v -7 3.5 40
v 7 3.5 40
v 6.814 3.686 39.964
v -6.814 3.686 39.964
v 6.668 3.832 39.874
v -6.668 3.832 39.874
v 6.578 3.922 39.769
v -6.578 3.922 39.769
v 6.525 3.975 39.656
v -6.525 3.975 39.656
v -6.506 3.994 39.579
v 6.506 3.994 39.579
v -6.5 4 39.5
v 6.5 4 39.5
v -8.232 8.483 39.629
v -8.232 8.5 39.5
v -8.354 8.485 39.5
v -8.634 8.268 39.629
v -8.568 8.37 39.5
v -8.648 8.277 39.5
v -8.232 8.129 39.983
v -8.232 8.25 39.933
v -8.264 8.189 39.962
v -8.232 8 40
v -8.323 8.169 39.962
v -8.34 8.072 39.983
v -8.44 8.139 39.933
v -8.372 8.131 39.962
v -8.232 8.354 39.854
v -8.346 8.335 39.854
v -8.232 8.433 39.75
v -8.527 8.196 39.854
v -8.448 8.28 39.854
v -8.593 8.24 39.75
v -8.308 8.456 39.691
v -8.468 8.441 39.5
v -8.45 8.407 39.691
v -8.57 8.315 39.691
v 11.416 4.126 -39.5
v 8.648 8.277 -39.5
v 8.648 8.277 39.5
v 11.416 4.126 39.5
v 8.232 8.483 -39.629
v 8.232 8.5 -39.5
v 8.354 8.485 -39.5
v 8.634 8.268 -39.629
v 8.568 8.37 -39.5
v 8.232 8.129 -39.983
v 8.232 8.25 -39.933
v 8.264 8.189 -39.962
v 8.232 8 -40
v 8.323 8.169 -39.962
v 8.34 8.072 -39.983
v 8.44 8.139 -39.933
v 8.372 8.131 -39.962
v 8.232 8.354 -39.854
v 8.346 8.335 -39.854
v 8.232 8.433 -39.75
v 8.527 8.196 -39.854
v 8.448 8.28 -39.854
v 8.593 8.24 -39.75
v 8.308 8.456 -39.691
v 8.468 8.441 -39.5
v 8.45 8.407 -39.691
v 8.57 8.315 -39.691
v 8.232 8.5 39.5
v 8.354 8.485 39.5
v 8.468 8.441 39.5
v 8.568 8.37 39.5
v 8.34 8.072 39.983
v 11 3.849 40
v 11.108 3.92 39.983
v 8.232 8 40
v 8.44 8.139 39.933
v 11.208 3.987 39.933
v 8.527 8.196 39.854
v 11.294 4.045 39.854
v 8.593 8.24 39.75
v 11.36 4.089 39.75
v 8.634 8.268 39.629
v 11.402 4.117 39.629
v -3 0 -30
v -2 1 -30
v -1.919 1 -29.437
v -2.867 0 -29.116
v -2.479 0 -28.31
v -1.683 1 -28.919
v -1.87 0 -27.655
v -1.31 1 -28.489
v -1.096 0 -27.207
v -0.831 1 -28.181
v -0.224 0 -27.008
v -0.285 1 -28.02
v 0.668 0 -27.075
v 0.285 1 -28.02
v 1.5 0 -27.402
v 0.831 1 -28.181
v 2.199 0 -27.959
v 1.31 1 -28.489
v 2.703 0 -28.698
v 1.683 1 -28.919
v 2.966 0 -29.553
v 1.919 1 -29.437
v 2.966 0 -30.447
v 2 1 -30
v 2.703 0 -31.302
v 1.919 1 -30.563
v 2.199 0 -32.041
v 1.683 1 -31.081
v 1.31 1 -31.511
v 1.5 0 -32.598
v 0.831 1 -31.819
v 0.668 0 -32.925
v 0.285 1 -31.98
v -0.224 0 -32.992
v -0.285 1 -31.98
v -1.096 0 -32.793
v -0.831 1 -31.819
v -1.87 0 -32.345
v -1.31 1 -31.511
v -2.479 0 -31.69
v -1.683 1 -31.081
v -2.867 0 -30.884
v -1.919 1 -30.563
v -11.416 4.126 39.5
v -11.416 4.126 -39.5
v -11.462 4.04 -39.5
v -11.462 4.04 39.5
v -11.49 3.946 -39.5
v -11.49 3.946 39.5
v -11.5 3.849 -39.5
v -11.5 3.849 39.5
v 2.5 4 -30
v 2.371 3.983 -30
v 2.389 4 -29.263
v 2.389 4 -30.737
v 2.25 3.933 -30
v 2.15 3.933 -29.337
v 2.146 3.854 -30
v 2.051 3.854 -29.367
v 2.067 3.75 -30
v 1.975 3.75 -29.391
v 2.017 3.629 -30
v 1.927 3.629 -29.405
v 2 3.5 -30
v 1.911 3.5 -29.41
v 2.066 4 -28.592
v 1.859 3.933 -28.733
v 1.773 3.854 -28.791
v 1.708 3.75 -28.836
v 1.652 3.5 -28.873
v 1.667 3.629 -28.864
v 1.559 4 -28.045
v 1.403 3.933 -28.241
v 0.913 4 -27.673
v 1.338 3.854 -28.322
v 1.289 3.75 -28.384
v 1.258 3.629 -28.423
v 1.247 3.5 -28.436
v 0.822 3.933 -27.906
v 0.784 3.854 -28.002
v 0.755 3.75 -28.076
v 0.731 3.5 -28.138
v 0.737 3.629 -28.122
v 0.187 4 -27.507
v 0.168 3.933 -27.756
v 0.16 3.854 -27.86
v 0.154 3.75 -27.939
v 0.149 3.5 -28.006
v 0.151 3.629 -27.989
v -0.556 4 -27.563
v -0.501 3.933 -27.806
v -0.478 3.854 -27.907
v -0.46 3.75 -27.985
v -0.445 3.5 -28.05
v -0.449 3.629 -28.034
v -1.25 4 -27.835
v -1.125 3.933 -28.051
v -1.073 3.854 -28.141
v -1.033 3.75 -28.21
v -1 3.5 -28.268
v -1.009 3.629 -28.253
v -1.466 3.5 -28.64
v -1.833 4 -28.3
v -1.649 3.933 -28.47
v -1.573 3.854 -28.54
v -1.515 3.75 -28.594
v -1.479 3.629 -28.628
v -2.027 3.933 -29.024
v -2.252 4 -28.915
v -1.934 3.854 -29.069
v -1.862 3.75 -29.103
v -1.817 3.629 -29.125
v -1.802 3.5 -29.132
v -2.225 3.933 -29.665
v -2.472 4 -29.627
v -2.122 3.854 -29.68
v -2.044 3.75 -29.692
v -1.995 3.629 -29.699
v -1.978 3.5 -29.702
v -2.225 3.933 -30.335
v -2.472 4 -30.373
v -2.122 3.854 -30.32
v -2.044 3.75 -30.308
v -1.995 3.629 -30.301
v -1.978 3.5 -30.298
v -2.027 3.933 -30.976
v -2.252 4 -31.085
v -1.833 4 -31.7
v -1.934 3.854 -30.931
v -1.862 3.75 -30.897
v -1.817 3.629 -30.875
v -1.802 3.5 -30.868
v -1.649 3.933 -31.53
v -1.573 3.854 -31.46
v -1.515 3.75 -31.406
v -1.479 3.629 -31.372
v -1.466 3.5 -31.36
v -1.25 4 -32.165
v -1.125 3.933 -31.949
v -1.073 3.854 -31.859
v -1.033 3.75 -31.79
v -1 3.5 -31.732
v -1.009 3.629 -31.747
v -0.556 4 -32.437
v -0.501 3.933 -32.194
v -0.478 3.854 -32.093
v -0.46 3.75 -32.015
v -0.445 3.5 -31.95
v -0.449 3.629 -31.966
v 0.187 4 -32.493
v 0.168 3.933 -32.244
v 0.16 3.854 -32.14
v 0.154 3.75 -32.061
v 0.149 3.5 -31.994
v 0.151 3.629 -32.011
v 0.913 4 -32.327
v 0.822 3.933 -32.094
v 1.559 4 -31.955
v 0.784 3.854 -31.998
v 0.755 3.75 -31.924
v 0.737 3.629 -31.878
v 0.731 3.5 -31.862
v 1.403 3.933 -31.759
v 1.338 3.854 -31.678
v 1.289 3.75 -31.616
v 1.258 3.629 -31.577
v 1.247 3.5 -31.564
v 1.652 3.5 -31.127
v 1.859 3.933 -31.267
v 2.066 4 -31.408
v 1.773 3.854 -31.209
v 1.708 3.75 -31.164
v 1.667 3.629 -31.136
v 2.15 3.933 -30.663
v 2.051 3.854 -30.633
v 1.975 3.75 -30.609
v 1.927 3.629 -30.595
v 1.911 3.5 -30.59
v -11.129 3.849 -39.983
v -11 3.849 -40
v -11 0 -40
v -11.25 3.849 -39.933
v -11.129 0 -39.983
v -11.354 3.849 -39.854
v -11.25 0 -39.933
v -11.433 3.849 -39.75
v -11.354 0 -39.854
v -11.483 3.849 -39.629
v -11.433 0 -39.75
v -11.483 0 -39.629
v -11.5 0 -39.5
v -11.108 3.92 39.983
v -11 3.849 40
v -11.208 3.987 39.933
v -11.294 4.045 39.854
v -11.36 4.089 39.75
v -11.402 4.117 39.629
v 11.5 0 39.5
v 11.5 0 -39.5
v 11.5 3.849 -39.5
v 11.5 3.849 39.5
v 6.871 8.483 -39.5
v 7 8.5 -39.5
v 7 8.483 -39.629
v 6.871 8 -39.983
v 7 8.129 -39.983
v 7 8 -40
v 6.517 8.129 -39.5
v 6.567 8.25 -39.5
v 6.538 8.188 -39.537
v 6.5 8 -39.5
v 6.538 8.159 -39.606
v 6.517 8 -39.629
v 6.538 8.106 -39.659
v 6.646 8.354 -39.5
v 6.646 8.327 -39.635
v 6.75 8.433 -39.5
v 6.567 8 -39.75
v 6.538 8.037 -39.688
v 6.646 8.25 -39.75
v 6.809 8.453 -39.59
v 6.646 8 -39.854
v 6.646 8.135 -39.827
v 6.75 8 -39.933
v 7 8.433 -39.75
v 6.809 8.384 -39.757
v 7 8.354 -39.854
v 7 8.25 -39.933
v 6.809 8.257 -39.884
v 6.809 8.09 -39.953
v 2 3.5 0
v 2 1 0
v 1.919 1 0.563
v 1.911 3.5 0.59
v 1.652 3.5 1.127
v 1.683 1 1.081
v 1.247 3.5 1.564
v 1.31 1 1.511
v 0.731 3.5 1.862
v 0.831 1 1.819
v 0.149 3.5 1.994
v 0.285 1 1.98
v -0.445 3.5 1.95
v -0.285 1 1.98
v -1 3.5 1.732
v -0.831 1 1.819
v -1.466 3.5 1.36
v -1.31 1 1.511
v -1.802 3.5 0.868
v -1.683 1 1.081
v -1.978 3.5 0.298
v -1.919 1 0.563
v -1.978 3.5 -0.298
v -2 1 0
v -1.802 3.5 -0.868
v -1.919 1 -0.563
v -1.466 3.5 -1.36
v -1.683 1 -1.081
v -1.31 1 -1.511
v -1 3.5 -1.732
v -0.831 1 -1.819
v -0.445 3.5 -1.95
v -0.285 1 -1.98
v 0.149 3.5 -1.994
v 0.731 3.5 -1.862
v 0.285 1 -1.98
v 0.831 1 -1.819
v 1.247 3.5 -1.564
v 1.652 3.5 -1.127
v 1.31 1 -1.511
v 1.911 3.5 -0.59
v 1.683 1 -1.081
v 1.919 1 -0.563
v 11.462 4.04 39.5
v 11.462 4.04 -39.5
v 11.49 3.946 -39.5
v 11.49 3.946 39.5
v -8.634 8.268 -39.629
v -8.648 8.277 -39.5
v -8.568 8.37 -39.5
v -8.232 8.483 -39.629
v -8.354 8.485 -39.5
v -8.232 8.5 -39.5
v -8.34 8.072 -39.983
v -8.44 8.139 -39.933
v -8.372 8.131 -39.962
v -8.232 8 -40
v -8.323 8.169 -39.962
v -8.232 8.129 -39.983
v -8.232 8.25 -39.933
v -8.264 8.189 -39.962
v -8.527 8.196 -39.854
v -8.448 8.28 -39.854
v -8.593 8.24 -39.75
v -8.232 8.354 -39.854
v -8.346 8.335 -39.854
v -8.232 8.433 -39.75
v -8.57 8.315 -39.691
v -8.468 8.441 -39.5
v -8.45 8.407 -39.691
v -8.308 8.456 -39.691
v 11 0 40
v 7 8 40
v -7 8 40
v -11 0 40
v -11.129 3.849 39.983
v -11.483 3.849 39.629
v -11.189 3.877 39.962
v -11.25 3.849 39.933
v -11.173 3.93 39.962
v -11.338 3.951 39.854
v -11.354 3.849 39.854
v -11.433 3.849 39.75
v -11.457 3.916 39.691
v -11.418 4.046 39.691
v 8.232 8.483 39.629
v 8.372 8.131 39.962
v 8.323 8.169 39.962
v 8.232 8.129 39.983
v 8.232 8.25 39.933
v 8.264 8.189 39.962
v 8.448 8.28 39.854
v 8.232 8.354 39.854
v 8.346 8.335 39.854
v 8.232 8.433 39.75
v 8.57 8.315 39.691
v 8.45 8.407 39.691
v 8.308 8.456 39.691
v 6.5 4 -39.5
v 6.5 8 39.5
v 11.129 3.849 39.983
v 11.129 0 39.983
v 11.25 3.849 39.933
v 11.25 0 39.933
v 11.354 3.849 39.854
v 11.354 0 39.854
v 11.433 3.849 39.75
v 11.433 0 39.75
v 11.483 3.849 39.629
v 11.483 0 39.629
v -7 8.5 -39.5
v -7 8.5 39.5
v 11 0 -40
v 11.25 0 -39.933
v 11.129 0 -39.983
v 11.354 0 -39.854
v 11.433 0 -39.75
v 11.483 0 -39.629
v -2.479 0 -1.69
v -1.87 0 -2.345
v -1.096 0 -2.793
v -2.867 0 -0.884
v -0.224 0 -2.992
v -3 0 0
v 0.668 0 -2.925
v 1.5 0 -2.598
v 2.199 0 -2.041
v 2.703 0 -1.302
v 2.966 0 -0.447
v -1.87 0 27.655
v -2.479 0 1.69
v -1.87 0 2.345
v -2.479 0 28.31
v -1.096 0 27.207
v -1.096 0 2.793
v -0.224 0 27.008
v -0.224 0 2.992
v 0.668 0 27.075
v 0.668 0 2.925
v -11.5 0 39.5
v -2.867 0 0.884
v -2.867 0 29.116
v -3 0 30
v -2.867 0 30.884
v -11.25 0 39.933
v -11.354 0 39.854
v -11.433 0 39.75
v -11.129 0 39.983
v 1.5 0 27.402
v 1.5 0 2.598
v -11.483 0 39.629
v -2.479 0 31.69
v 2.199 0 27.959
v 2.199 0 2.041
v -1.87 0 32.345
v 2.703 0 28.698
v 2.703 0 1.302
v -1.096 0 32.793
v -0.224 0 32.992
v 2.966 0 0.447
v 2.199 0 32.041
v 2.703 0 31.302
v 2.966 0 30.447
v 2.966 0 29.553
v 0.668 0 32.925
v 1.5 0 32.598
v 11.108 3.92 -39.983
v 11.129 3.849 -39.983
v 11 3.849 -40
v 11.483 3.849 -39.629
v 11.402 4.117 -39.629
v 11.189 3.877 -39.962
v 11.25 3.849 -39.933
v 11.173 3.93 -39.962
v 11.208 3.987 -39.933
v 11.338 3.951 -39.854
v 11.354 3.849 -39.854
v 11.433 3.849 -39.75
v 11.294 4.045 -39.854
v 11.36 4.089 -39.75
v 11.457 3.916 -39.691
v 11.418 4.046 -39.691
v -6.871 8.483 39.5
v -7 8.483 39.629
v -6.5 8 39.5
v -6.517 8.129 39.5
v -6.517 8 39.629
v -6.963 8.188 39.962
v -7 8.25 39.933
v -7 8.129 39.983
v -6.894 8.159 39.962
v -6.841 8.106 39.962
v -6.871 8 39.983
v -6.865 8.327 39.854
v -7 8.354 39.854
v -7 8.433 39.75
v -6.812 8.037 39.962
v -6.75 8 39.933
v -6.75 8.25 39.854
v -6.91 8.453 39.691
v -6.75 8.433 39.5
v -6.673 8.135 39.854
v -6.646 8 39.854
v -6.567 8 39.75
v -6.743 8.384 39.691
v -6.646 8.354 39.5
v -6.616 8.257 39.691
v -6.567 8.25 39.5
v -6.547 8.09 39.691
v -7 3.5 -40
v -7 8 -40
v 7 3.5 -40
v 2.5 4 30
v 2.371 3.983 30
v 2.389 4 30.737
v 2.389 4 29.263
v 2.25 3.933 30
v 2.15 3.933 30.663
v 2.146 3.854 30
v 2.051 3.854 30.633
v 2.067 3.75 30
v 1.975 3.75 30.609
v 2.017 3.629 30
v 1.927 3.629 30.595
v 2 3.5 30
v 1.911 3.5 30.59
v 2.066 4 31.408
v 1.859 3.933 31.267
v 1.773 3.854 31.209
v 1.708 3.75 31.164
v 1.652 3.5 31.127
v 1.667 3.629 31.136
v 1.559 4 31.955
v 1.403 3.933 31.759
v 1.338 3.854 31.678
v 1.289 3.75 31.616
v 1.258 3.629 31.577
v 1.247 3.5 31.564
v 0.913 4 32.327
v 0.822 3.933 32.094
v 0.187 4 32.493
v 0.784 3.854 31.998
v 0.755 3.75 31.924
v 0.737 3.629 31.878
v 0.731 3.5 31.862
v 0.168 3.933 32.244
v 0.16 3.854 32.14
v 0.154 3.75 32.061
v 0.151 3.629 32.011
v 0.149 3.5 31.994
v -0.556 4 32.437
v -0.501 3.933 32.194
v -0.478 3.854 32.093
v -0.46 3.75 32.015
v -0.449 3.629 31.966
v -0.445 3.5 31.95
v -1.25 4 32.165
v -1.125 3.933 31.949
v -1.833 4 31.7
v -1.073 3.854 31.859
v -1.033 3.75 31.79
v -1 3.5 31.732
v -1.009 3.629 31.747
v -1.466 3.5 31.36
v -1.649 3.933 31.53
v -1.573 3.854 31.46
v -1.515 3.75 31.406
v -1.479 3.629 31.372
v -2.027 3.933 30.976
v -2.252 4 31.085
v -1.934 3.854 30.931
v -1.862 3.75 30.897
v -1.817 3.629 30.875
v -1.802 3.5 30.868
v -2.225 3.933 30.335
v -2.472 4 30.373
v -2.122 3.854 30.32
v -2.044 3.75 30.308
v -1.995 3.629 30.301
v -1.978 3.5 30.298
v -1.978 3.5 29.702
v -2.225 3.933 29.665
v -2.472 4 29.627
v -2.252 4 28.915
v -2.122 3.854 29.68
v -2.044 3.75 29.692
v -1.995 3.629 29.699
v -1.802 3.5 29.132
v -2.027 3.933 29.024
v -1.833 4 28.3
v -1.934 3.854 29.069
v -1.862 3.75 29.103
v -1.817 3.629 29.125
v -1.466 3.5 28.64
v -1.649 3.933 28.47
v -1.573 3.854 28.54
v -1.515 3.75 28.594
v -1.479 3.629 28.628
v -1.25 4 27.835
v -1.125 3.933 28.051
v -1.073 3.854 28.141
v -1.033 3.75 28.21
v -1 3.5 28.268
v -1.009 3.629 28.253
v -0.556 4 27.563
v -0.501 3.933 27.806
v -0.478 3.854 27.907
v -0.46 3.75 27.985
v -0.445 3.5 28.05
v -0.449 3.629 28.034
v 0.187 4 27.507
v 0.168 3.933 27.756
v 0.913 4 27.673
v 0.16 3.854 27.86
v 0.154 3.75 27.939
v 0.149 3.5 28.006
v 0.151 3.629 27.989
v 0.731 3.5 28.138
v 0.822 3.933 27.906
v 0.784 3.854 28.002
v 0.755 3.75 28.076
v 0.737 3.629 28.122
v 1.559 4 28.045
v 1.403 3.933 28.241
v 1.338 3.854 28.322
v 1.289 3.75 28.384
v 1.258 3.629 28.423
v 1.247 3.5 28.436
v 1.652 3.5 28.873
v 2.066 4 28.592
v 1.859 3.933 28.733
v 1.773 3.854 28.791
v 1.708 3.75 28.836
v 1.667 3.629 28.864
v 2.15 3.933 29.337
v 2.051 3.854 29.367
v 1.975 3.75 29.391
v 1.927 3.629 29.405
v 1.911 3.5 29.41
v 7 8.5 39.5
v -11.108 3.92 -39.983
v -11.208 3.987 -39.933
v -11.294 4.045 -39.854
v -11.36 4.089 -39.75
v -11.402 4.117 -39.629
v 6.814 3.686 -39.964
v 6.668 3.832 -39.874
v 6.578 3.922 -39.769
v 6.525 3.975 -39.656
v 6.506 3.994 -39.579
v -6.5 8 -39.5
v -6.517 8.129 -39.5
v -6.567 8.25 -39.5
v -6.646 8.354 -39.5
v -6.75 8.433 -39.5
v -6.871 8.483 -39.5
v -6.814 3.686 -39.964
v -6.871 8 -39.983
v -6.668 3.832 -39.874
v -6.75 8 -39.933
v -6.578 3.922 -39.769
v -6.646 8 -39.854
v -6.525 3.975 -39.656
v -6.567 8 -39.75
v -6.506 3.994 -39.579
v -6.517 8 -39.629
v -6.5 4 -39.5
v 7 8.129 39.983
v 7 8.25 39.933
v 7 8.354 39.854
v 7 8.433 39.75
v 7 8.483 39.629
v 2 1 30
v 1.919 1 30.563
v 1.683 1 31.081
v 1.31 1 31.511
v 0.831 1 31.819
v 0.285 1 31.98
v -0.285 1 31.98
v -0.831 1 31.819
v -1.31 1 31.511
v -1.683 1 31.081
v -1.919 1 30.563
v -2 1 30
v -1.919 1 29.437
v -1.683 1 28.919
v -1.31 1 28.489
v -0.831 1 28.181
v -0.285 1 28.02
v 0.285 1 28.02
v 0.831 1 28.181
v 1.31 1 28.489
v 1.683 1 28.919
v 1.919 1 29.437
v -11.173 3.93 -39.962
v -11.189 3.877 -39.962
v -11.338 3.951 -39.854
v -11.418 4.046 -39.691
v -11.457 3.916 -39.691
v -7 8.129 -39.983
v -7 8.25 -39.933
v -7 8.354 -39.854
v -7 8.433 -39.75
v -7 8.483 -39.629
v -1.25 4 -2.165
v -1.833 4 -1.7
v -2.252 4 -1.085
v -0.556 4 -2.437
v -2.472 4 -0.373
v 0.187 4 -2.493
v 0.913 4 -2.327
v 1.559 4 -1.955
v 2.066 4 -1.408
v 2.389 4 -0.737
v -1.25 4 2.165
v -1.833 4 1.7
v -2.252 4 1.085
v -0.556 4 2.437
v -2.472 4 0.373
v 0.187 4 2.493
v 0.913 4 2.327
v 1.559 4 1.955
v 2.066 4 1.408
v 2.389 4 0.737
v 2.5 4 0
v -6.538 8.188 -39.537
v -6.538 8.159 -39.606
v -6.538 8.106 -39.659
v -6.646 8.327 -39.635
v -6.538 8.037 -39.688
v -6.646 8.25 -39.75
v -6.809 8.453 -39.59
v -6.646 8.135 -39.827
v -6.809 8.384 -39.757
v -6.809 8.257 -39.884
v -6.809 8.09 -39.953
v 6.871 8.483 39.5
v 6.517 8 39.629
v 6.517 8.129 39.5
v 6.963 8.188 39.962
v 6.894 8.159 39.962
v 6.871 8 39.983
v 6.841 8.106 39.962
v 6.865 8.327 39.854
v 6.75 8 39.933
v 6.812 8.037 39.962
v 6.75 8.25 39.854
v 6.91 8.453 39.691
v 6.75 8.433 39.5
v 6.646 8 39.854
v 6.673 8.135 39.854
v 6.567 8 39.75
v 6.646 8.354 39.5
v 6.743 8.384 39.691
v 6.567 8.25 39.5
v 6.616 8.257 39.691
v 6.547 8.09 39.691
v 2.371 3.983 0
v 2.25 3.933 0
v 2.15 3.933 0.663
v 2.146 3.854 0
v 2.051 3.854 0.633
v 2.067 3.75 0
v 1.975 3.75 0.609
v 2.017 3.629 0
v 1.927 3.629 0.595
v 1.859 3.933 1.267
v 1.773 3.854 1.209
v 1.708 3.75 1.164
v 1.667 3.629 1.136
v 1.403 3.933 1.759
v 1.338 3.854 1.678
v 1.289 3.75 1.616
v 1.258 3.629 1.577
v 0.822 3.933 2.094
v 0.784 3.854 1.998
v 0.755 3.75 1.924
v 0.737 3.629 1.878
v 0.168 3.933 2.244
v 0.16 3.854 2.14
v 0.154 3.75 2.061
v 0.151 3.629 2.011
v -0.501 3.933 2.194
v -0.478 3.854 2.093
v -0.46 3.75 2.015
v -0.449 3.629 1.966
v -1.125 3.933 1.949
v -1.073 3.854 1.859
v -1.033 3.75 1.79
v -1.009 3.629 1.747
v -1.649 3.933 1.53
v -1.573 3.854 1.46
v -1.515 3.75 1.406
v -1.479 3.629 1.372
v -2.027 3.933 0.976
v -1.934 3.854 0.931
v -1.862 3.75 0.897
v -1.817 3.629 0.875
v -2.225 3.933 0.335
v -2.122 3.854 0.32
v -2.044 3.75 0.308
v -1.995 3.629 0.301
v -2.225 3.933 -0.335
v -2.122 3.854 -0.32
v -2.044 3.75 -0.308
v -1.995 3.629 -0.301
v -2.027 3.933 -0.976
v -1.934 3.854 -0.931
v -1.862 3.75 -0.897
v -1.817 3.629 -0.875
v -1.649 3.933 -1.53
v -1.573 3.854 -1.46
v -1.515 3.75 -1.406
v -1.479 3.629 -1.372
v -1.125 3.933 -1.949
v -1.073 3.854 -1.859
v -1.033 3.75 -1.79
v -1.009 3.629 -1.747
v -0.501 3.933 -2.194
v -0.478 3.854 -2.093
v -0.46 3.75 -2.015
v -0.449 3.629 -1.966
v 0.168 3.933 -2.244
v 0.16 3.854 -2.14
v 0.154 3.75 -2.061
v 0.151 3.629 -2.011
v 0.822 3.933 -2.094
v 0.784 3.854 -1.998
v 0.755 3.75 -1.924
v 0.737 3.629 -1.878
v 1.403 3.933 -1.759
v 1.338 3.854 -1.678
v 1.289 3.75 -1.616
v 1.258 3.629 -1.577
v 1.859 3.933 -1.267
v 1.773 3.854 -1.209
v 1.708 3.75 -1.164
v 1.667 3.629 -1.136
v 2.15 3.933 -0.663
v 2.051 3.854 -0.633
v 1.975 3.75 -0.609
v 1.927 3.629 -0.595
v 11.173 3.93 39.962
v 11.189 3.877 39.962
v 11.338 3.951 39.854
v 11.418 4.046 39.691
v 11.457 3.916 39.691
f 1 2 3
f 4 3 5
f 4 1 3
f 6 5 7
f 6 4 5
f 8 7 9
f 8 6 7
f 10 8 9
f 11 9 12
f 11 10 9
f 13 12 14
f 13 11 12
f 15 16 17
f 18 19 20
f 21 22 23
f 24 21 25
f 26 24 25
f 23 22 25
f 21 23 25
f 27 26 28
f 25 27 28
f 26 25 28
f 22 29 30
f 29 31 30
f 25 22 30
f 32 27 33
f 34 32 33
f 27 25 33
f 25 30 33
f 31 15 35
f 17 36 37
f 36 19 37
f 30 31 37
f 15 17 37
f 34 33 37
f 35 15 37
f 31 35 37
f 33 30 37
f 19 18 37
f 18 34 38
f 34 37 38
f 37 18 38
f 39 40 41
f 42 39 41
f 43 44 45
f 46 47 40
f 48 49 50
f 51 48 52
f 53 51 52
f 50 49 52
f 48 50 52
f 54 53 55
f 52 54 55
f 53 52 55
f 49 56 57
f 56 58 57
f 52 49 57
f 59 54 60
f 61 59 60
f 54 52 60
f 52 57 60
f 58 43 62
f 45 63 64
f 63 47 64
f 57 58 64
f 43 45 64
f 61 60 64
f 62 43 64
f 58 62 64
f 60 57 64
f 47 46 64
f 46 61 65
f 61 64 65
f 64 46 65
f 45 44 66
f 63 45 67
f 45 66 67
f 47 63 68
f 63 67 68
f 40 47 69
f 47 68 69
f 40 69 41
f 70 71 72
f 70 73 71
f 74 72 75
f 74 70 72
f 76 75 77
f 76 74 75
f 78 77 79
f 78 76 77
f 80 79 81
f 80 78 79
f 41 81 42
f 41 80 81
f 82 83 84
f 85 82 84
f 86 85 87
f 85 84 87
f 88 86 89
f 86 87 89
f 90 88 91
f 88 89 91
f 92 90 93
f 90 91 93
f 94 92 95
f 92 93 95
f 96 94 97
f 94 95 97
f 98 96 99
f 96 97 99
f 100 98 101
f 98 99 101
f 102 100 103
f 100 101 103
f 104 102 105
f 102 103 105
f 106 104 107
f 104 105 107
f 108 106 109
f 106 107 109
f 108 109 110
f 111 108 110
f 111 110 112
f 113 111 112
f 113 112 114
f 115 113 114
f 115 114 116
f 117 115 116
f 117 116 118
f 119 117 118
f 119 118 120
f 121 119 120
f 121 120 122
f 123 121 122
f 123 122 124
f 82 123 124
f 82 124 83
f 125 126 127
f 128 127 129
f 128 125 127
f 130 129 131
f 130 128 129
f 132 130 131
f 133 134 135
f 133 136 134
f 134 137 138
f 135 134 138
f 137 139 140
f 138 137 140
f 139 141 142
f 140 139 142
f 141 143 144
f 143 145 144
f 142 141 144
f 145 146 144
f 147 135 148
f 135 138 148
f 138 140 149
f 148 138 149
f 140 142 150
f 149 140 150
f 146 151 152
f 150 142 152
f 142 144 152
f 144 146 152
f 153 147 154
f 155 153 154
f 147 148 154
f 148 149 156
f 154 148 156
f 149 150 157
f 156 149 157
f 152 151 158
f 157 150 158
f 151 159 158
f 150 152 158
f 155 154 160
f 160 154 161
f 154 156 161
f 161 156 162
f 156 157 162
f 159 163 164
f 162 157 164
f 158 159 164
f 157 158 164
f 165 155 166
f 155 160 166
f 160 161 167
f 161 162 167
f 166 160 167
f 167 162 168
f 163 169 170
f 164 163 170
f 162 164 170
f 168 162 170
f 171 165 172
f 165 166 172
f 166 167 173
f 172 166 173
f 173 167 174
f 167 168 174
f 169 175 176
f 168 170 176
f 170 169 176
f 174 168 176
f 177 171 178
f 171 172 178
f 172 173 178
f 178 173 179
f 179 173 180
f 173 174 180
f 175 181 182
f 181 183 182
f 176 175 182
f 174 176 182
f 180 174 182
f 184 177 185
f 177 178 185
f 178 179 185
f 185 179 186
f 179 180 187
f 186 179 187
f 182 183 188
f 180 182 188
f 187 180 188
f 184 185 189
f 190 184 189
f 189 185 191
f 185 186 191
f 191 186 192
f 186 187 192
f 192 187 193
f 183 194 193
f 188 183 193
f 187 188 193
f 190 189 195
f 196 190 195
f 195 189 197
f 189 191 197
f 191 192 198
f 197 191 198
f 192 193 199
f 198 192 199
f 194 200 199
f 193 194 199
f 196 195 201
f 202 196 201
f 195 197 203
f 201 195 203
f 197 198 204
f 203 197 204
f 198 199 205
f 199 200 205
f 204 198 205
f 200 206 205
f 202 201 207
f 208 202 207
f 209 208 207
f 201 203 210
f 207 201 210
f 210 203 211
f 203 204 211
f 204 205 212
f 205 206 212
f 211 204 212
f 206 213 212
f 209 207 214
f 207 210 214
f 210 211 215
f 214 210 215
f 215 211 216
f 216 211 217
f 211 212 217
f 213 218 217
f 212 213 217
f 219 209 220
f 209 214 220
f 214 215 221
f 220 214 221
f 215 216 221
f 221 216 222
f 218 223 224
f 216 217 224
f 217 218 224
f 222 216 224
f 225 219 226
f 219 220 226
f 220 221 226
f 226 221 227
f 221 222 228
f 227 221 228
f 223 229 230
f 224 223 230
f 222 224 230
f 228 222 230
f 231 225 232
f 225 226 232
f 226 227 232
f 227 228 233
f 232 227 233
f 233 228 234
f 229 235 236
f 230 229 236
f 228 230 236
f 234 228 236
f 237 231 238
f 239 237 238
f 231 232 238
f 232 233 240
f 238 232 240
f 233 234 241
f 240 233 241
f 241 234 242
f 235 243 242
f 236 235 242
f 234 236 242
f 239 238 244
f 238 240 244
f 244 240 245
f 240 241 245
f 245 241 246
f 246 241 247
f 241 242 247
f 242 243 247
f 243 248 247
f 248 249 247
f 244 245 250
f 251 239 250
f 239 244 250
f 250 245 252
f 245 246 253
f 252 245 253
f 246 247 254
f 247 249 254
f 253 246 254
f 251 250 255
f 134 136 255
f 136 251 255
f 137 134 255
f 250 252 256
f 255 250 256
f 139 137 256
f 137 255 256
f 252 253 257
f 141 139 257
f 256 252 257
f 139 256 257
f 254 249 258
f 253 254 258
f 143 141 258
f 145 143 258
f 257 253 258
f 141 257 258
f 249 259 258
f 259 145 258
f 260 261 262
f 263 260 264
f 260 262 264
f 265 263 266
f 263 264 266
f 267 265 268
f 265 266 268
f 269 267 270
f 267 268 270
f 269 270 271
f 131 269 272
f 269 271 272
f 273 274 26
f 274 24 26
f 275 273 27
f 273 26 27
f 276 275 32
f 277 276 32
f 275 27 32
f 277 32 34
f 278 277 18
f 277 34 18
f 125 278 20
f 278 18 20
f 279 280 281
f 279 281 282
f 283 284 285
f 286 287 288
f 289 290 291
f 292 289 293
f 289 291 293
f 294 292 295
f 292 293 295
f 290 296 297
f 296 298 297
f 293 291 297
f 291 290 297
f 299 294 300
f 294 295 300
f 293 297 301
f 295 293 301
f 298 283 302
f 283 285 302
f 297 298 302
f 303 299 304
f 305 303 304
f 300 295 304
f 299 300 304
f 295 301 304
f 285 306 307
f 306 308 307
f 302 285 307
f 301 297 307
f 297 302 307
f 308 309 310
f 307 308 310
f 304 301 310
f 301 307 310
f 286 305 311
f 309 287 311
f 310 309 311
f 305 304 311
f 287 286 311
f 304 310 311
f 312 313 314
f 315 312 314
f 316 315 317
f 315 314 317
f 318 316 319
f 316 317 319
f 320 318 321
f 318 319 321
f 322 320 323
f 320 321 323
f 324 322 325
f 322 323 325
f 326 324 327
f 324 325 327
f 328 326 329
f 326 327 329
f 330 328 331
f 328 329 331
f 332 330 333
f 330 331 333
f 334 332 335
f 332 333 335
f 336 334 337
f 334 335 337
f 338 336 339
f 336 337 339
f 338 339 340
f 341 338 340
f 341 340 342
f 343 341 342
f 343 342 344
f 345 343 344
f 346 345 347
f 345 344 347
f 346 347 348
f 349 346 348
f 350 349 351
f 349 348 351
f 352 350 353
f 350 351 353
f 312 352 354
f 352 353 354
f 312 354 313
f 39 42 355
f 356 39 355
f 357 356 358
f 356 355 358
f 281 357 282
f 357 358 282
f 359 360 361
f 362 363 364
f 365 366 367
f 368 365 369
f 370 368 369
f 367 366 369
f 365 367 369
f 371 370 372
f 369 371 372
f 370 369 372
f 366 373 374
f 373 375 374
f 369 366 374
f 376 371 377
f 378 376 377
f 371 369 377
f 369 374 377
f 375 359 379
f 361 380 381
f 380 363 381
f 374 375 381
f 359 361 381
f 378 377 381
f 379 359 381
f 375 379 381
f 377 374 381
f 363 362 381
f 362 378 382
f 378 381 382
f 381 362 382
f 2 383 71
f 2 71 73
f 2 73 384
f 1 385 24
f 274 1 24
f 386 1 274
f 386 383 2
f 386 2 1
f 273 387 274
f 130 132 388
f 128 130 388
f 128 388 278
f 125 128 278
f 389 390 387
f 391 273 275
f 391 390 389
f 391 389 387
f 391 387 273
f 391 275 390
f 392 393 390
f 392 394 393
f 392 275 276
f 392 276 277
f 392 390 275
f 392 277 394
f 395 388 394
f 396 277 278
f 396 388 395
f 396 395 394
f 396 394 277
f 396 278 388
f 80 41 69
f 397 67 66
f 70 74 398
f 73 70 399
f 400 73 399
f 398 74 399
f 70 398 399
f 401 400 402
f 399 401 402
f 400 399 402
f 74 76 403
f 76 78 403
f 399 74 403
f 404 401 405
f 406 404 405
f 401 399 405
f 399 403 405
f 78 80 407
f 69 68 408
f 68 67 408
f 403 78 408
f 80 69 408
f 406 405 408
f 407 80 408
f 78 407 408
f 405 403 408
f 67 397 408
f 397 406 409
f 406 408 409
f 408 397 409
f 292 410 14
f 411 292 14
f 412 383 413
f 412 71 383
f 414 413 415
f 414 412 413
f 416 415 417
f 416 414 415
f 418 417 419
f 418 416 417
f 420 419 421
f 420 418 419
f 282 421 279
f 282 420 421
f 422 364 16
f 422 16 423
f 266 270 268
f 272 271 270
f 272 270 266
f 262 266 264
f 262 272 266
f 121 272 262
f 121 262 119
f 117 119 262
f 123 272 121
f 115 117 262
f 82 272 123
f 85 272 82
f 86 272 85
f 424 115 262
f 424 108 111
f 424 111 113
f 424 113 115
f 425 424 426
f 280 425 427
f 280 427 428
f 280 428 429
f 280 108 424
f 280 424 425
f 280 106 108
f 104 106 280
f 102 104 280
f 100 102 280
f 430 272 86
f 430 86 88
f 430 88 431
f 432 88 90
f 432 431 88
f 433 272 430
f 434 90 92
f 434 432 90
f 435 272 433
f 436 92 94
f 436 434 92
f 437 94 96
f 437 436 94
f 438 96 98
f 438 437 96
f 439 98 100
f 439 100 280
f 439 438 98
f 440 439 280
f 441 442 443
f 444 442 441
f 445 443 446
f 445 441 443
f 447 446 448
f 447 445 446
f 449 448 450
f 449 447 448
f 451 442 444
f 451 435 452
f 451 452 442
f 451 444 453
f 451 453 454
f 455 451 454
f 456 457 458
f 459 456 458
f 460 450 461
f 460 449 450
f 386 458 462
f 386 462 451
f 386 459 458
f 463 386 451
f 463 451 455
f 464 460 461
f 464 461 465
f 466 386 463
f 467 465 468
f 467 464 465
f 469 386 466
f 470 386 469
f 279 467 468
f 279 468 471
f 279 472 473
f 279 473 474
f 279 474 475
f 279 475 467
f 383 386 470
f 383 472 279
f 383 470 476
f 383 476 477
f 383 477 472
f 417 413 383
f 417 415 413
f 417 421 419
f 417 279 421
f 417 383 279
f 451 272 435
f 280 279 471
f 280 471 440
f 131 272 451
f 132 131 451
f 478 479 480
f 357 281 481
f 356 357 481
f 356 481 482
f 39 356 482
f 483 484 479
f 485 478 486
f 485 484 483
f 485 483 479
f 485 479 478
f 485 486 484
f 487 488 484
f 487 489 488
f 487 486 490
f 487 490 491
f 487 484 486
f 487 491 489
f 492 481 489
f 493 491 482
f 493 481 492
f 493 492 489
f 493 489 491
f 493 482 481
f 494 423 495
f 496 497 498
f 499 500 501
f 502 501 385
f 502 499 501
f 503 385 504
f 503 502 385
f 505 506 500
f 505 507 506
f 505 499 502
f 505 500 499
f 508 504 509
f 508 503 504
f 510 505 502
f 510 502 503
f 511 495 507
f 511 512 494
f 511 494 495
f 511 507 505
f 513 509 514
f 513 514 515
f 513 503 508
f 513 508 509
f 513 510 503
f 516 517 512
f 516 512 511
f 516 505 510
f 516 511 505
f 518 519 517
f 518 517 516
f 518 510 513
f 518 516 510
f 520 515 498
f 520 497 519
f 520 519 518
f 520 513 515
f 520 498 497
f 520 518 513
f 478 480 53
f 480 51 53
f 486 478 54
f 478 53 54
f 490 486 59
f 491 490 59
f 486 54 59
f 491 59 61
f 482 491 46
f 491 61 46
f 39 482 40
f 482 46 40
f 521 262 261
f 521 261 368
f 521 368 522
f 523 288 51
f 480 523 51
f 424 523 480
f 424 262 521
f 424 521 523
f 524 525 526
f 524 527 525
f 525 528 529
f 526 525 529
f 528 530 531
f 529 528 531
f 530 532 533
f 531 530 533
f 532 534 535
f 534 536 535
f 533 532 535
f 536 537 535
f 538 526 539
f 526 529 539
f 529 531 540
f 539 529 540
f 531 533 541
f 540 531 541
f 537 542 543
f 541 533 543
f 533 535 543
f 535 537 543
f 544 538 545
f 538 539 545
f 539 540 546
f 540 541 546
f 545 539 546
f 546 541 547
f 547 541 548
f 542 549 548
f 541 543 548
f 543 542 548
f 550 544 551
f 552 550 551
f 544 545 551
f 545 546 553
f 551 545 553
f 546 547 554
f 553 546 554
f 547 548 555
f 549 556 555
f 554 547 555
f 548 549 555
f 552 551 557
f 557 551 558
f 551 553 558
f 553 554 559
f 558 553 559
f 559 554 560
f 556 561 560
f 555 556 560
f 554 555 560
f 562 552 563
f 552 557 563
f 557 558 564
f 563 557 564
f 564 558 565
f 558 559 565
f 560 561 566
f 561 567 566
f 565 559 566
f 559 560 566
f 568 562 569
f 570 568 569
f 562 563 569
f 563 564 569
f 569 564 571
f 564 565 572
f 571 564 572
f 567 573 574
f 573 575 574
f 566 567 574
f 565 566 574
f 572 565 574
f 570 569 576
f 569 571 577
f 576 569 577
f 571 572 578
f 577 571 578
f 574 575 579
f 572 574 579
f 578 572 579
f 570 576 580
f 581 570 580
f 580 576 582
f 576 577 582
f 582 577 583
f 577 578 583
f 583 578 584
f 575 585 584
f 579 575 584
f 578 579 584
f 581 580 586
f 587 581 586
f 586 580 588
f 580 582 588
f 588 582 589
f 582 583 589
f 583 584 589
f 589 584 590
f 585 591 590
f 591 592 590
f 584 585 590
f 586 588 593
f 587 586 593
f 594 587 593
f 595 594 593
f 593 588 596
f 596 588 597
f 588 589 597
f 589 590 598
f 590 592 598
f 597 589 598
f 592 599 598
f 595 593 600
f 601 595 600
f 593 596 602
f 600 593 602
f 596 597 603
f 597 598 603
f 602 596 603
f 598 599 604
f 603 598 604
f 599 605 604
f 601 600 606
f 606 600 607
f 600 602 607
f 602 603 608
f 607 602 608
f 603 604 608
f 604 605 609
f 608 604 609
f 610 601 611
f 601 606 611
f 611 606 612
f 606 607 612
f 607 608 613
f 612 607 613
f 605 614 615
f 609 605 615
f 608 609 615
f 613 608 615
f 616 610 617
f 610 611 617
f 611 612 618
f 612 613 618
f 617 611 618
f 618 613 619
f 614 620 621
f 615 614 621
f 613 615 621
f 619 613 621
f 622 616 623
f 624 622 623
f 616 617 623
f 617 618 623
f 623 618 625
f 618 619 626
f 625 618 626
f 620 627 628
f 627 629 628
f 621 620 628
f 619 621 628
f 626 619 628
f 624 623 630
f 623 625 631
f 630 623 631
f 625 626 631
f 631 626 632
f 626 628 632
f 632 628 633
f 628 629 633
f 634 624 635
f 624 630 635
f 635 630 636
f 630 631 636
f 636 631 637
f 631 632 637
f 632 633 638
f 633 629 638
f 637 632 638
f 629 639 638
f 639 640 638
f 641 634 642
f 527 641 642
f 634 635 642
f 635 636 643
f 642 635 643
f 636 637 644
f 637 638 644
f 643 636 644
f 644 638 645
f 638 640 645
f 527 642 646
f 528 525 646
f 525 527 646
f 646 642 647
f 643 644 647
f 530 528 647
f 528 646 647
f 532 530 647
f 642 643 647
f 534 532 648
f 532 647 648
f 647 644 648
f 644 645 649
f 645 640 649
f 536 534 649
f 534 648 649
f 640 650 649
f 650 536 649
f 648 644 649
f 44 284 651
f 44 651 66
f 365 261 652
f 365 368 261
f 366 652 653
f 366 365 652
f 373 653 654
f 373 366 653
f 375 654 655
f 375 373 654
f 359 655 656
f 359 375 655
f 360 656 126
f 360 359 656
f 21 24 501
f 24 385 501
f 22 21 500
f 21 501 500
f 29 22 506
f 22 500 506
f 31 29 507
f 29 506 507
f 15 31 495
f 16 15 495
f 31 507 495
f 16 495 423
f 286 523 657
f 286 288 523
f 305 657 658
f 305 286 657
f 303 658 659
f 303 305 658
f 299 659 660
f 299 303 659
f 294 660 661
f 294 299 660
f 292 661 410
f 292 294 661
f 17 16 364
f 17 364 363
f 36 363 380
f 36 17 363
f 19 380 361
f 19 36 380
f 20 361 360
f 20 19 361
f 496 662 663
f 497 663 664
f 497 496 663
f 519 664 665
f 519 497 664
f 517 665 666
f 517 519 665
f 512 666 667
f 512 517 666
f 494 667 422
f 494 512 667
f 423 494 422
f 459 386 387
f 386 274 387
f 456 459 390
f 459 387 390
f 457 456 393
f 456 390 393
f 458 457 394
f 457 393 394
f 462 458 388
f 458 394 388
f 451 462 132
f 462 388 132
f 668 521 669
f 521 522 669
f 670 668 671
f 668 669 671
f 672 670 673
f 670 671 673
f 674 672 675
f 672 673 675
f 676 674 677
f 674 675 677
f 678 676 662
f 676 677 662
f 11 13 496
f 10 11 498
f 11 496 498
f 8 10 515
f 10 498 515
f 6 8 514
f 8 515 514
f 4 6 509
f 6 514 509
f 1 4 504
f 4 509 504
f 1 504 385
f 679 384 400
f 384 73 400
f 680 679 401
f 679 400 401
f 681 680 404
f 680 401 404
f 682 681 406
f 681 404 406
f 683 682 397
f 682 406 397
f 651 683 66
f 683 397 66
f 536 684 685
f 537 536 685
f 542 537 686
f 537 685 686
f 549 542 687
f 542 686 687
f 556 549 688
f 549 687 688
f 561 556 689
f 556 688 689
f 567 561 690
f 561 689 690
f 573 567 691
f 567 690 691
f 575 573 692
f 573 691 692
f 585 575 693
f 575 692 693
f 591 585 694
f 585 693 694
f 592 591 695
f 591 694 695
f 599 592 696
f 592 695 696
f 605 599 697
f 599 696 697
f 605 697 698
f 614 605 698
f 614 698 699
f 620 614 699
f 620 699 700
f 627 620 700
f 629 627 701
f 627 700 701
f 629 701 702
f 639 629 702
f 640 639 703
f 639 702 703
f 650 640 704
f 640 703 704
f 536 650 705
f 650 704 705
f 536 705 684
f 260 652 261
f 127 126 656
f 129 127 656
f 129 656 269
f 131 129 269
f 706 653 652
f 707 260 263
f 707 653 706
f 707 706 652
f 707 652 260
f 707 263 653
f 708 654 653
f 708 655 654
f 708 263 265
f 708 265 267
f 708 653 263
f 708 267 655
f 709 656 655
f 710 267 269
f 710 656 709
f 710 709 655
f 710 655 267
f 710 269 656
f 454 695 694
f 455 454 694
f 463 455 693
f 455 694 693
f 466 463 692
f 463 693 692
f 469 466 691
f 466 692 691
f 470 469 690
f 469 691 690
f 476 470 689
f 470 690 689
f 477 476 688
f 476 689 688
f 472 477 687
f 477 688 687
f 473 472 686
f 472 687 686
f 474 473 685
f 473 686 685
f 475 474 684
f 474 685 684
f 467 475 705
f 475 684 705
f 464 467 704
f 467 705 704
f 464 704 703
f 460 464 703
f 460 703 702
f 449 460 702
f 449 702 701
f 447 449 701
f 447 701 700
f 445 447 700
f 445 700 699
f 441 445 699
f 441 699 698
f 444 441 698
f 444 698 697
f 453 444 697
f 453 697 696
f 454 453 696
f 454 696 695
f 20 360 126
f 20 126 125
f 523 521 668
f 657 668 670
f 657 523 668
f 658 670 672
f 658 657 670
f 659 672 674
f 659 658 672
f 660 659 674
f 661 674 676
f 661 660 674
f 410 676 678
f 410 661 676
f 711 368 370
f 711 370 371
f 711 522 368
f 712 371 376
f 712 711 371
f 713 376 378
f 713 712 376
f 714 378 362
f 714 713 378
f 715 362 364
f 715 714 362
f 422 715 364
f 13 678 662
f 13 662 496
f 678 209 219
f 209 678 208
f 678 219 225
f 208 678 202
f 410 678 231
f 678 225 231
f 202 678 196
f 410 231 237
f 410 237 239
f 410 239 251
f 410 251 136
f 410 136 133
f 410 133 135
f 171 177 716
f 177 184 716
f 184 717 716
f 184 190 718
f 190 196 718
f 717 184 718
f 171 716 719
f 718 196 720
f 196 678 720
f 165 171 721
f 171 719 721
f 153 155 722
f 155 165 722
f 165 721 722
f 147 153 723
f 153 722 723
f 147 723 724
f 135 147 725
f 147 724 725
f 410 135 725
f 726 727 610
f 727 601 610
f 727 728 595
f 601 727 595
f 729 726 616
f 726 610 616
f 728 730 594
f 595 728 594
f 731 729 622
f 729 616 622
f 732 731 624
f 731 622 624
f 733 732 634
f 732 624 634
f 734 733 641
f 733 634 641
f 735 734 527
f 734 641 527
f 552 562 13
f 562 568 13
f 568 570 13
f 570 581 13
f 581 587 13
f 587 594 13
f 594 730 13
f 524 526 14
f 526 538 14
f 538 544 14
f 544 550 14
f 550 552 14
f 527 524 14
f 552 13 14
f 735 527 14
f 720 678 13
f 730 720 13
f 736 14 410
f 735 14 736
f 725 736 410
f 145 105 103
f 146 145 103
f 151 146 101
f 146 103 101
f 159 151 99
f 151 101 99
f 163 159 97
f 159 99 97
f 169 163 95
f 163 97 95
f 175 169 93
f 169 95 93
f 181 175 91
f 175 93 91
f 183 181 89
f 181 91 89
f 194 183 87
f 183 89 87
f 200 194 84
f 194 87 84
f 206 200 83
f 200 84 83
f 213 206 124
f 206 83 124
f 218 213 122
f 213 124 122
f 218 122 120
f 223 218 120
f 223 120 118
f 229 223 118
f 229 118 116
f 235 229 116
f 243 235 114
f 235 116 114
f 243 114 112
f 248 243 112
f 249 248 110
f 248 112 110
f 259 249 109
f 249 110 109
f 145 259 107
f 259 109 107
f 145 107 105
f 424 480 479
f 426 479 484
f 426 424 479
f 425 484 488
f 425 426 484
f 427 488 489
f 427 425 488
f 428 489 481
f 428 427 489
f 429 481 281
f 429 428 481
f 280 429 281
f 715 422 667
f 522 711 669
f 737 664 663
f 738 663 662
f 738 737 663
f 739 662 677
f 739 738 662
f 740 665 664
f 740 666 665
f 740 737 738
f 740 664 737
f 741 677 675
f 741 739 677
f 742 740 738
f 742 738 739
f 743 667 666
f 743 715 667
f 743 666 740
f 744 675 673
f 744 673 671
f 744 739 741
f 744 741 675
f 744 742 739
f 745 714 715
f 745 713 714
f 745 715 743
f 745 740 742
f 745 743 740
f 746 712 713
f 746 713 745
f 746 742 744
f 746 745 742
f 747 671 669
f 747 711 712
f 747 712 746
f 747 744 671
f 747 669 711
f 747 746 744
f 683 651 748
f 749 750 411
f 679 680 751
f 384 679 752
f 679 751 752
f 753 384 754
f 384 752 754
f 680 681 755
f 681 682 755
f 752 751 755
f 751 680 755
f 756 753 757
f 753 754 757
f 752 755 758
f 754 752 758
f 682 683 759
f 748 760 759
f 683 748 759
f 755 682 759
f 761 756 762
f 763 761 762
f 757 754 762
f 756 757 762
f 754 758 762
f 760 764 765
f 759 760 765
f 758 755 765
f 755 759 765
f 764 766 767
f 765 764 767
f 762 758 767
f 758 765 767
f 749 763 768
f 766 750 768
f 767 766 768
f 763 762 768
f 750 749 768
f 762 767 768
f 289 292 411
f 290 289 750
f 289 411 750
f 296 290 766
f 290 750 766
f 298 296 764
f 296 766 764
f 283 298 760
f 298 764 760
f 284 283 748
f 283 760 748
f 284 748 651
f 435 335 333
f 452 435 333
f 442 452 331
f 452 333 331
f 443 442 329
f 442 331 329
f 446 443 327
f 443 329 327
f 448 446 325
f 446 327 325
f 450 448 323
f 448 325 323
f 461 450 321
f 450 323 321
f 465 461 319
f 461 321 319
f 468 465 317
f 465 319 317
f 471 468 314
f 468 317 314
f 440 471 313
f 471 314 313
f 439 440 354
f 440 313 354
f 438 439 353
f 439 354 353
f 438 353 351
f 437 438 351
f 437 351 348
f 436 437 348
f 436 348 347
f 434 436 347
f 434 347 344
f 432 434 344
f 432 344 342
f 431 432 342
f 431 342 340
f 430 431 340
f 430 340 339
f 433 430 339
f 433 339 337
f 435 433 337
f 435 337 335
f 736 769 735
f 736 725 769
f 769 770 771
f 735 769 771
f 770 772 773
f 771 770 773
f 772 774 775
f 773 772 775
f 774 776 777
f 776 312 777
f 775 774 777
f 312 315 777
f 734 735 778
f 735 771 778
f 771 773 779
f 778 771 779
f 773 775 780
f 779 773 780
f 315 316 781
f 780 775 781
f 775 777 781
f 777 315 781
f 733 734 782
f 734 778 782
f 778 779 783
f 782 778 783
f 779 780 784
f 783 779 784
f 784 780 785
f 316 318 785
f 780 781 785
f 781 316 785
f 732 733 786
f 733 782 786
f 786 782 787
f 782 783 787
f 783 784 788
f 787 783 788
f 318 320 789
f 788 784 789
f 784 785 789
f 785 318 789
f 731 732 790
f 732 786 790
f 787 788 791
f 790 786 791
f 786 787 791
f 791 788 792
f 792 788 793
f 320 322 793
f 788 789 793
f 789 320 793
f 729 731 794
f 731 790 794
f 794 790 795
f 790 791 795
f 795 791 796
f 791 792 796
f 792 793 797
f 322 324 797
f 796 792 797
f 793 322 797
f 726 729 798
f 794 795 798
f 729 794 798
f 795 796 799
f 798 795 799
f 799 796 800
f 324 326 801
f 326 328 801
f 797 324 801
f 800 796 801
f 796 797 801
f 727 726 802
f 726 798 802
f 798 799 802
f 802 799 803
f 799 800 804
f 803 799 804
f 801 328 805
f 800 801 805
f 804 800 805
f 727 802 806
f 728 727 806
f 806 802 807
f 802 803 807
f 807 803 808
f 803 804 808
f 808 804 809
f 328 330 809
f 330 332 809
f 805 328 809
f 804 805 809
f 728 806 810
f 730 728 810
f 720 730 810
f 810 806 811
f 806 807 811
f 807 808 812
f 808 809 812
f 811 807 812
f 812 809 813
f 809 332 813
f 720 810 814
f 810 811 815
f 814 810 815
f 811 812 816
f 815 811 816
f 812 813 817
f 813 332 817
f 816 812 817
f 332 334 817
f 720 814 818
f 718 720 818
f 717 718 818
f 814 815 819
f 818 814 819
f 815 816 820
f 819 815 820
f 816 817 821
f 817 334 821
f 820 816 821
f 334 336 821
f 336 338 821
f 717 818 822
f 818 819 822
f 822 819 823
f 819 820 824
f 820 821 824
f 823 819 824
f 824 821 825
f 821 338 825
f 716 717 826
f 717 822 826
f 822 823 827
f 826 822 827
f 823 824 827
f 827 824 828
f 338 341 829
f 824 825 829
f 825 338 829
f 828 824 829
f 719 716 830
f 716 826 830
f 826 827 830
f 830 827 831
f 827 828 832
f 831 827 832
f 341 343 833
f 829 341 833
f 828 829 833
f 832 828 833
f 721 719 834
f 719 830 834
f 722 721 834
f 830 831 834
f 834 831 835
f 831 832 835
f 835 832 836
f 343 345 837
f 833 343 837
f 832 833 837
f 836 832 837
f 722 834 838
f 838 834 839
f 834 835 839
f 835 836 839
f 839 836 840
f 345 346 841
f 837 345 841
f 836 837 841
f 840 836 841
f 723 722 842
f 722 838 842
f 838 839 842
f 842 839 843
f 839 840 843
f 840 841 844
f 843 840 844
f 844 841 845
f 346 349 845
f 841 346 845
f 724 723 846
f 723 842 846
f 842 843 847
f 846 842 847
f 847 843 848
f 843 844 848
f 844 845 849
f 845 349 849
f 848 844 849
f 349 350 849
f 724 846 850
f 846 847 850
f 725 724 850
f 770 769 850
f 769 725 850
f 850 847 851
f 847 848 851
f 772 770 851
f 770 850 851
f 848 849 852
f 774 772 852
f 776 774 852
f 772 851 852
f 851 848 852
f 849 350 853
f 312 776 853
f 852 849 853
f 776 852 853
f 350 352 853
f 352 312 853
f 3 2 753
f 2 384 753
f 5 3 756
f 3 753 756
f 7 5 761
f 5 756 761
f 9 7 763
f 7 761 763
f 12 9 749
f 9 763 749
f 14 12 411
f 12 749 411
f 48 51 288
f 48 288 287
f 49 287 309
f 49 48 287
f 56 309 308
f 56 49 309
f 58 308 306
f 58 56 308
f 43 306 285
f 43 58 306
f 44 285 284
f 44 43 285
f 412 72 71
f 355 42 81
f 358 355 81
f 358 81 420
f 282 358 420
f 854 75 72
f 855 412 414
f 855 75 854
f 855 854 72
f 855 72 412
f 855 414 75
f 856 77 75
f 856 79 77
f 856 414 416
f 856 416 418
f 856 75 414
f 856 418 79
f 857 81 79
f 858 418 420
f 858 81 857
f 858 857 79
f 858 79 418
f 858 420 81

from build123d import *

# Parameters (mm, degrees)
F0_W           = 12
F0_H           = 80
F0_R           = 2
F0_W_2         = 5
F0_W_3         = 0.5
F1_DEPTH       = 4
F2_DEPTH       = 8.5
F3_SIZE2       = 3
F3_SIZE        = 4.5
F4_SIZE2       = 3
F4_SIZE        = 4.5
F5_D           = 4
F5_CSINK_D     = 6
F5_CSINK_ANGLE = 90
F6_R           = 0.5


with BuildPart() as f1:
    # F0 (on Front) → F1 (new body)
    with BuildSketch(Plane.XZ):
        Rectangle(F0_W, F0_H)
        with Locations((0, -30)):
            Circle(F0_R, mode=Mode.SUBTRACT)
        Circle(F0_R, mode=Mode.SUBTRACT)
        with Locations((0, 30)):
            Circle(F0_R, mode=Mode.SUBTRACT)
        with Locations((-9, 0)):
            Rectangle(F0_W_2, F0_H)
        with Locations((-6.25, 0)):
            Rectangle(F0_W_3, F0_H)
        with Locations((6.25, 0)):
            Rectangle(F0_W_3, F0_H)
        with Locations((9, 0)):
            Rectangle(F0_W_2, F0_H)
    extrude(amount=-F1_DEPTH)

    # F0 (on Front) → F2 (join)
    with BuildSketch(Plane.XZ):
        with Locations((-9, 0)):
            Rectangle(F0_W_2, F0_H)
        with Locations((9, 0)):
            Rectangle(F0_W_2, F0_H)
    extrude(amount=-F2_DEPTH)

    # F3
    f3_edges = [f1.edges().sort_by_distance(p)[0] for p in [
        (-11.5, 8.5, 0),
    ]]
    f3_side = f1.faces().sort_by_distance((-11.5, 4.25, 0))[0]
    chamfer(f3_edges, length=F3_SIZE, length2=F3_SIZE2, reference=f3_side)

    # F4
    f4_edges = [f1.edges().sort_by_distance(p)[0] for p in [
        (11.5, 8.5, 0),
    ]]
    f4_side = f1.faces().sort_by_distance((11.5, 4.25, 0))[0]
    chamfer(f4_edges, length=F4_SIZE, length2=F4_SIZE2, reference=f4_side)

    # F5 (through all)
    with Locations(Plane.XZ):
        with Locations((0, 0), (0, -30), (0, 30)):
            CounterSinkHole(F5_D / 2, F5_CSINK_D / 2, counter_sink_angle=F5_CSINK_ANGLE)

    # F6
    f6_edges = [f1.edges().sort_by_distance(p)[0] for p in [
        (10, 6.25, -40),
        (11.5, 4, 0),
        (8.5, 8.5, 0),
        (10, 6.25, 40),
        (7.5, 8.5, -40),
        (6.5, 8.5, 0),
        (7.5, 8.5, 40),
        (-7.5, 8.5, -40),
        (-8.5, 8.5, 0),
        (-6.5, 8.5, 0),
        (-7.5, 8.5, 40),
        (-10, 6.25, 40),
        (-11.5, 4, 0),
        (-10, 6.25, -40),
        (-2, 4, -30),
        (-2, 4, 0),
        (0, 4, -40),
        (6.5, 6.25, -40),
        (-6.5, 6.25, -40),
        (-11.5, 2, -40),
        (11.5, 2, -40),
        (11.5, 2, 40),
        (6.5, 6.25, 40),
        (0, 4, 40),
        (-6.5, 6.25, 40),
        (-11.5, 2, 40),
        (-2, 4, 30),
    ]]
    fillet(f6_edges, radius=F6_R)


solid = f1.part
